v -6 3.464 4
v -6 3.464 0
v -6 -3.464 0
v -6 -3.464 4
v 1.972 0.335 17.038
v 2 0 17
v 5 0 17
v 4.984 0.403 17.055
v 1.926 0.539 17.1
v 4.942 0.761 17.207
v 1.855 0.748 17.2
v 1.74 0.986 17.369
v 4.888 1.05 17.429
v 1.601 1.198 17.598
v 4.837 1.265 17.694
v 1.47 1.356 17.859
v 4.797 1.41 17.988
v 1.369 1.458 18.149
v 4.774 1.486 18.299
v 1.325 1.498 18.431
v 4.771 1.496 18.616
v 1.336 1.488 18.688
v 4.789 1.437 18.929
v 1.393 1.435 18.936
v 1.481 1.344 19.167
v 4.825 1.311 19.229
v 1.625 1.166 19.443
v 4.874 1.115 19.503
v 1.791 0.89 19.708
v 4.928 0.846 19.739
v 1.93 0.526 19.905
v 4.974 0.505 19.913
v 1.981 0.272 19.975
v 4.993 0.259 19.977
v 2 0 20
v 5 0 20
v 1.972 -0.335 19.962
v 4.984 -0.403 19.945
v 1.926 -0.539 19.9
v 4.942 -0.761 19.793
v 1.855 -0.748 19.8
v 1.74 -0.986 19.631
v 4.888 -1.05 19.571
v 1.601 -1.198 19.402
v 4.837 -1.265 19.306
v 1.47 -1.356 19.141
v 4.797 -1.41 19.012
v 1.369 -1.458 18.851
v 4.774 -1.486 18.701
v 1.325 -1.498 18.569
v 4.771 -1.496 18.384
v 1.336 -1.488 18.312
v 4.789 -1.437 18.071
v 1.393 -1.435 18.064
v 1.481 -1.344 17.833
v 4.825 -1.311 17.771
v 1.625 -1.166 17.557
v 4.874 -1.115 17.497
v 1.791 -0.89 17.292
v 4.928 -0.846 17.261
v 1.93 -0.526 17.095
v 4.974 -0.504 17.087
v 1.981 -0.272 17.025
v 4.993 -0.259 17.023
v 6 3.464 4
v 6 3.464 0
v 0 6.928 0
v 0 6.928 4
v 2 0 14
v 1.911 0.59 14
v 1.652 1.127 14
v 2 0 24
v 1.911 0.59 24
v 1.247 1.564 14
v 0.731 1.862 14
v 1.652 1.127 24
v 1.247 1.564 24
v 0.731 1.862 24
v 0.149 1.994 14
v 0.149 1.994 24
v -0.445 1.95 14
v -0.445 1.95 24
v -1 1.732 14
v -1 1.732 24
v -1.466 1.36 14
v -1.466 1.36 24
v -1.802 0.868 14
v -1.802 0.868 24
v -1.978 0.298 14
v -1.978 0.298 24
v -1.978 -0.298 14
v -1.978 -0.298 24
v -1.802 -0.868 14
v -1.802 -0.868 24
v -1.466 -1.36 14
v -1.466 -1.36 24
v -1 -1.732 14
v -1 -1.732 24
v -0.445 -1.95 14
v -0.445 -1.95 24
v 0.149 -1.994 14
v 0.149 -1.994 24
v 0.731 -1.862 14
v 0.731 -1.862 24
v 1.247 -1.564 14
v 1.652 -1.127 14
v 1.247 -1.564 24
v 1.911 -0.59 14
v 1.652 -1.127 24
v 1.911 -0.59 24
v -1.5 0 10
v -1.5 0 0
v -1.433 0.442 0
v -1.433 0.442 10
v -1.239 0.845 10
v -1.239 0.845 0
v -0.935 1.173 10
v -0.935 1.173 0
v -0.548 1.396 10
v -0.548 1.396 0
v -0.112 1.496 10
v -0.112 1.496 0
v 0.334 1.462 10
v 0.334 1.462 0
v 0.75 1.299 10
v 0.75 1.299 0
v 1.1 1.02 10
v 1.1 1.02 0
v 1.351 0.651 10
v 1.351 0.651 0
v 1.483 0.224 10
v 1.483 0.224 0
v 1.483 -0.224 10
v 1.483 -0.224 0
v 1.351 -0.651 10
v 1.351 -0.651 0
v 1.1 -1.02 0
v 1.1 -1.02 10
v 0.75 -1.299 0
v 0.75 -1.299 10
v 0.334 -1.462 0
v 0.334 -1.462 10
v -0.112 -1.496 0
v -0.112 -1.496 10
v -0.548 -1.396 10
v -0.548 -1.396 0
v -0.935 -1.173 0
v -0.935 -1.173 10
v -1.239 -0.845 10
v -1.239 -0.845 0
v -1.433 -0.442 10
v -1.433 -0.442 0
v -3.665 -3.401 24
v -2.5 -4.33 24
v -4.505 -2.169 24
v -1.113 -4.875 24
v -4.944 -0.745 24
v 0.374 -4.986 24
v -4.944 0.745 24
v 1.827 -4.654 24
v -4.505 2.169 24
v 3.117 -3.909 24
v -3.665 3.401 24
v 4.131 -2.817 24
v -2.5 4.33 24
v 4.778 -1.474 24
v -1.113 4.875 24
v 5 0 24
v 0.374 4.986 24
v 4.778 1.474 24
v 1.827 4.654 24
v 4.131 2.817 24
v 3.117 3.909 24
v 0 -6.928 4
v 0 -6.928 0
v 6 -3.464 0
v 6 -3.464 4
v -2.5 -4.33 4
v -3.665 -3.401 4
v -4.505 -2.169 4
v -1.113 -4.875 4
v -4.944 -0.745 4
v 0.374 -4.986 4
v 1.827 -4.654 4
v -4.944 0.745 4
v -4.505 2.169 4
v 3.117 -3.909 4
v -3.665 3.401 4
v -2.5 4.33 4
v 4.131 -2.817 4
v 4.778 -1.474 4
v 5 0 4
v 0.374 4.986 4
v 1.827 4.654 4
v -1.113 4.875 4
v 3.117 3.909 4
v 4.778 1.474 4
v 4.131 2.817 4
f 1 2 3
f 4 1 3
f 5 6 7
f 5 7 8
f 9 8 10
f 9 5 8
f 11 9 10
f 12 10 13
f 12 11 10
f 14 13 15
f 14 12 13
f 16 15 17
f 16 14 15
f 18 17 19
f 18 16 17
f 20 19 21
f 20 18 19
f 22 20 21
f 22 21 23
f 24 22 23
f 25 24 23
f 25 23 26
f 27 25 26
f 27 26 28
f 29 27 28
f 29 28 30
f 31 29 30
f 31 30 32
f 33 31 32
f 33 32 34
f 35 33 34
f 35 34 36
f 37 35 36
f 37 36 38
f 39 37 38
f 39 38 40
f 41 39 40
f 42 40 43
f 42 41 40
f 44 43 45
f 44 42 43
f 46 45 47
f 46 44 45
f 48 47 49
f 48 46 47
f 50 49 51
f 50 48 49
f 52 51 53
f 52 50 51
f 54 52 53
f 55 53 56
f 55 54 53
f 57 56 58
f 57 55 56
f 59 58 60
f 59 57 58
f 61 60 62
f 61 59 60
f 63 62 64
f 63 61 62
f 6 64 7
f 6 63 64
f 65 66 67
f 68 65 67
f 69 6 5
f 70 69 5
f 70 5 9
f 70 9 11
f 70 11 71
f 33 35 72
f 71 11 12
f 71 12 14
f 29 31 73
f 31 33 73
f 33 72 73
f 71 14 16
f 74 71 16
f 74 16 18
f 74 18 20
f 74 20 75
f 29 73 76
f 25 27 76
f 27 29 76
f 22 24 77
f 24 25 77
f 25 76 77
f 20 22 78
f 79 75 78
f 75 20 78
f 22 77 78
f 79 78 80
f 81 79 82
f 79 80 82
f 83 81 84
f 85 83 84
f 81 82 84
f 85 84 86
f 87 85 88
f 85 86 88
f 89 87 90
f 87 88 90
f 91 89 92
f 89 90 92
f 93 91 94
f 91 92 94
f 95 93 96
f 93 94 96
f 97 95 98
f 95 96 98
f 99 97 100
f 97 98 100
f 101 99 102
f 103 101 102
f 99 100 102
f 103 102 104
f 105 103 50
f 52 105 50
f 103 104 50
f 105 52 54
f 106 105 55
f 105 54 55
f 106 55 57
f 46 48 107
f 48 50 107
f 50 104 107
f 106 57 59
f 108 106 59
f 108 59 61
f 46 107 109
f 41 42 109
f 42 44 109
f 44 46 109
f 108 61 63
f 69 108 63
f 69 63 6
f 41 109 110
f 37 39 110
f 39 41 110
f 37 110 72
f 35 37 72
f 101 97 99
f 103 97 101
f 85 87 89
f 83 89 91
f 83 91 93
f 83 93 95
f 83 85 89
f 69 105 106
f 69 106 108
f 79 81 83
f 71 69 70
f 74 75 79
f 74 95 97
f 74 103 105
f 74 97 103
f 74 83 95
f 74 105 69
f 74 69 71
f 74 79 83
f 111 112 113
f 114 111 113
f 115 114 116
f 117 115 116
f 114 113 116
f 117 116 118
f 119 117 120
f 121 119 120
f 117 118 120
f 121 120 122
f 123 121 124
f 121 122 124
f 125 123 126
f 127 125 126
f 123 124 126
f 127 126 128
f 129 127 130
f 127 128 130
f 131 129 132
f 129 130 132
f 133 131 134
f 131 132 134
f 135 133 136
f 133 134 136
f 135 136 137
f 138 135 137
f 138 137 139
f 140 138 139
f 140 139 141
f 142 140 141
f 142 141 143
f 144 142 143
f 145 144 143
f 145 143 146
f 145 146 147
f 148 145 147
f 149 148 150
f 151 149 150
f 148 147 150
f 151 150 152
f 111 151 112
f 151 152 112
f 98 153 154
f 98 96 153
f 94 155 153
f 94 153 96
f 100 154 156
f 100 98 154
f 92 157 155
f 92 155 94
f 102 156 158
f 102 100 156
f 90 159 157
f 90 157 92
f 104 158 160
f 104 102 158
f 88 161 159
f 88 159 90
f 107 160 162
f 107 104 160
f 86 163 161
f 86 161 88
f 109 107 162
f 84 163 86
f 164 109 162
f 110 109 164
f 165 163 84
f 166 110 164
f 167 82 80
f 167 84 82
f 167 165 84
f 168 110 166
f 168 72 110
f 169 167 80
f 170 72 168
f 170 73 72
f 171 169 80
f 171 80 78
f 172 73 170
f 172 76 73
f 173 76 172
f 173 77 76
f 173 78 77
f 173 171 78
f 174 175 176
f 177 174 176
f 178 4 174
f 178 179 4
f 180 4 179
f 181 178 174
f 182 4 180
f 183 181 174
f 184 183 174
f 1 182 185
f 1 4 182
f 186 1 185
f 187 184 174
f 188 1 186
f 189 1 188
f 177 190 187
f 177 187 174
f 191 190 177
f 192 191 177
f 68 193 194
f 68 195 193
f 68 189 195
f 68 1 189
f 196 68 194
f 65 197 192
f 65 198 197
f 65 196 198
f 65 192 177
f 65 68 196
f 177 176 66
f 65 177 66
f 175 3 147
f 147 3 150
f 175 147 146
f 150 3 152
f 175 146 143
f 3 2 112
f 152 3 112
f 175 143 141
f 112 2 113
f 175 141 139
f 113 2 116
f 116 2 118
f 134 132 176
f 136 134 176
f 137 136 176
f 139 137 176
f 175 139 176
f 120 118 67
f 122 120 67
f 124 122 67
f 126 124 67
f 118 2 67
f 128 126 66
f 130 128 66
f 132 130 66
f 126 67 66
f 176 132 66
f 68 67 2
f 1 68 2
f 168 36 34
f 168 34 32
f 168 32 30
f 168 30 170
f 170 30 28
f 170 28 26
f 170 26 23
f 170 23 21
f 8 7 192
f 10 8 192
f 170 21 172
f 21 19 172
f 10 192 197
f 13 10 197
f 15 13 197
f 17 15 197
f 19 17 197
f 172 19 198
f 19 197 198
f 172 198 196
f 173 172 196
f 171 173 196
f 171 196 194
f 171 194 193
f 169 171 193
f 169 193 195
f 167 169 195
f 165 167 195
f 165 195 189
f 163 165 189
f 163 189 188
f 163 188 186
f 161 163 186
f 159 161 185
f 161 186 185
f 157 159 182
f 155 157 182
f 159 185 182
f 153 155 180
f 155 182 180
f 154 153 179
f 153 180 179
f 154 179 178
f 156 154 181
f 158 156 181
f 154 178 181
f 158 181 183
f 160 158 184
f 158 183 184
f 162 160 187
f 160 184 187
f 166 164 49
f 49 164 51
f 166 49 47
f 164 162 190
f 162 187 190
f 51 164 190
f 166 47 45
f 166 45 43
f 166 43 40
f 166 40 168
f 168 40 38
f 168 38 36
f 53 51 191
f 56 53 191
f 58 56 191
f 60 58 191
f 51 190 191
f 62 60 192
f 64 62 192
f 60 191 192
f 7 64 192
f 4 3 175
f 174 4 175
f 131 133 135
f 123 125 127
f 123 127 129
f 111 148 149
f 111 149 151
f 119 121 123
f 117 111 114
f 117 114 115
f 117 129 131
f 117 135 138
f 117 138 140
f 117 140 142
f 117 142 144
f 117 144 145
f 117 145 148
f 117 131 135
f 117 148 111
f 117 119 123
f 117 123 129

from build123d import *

# Parameters (mm, degrees)
BOSS_EXTRUDE1_DEPTH = 4
SKETCH2_R           = 5
BOSS_EXTRUDE2_DEPTH = 20
SKETCH3_R           = 2
CUT_EXTRUDE1_DEPTH  = 10
SKETCH4_R           = 1.5
CUT_EXTRUDE2_DEPTH  = 7
SKETCH5_R           = 1.5
CUT_EXTRUDE3_DEPTH  = 10


with BuildPart() as part:
    # Sketch1 → Boss-Extrude1 (new body)
    with BuildSketch(Plane.XY):
        Polygon((0, 6.92820323), (-6, 3.464101615), (-6, -3.464101615), (0, -6.92820323), (6, -3.464101615), (6, 3.464101615), align=None)
    extrude(amount=BOSS_EXTRUDE1_DEPTH)

    # Sketch2 → Boss-Extrude2 (add)
    with BuildSketch(Plane.XY.offset(4)):
        Circle(SKETCH2_R)
    extrude(amount=BOSS_EXTRUDE2_DEPTH)

    # Sketch3 → Cut-Extrude1 (cut)
    with BuildSketch(Plane.XY.offset(24)):
        Circle(SKETCH3_R)
    extrude(amount=-CUT_EXTRUDE1_DEPTH, mode=Mode.SUBTRACT)

    # Sketch4 → Cut-Extrude2 (cut)
    with BuildSketch(Plane(origin=(0, 0, 0), x_dir=(0, 0, -1), z_dir=(1, 0, 0))):
        with Locations((-18.5, 0)):
            Circle(SKETCH4_R)
    extrude(amount=CUT_EXTRUDE2_DEPTH, mode=Mode.SUBTRACT)

    # Sketch5 → Cut-Extrude3 (cut)
    with BuildSketch(Plane(origin=(0, 0, 0), x_dir=(-1, 0, 0), z_dir=(0, 0, -1))):
        Circle(SKETCH5_R)
    extrude(amount=-CUT_EXTRUDE3_DEPTH, mode=Mode.SUBTRACT)


solid = part.part
